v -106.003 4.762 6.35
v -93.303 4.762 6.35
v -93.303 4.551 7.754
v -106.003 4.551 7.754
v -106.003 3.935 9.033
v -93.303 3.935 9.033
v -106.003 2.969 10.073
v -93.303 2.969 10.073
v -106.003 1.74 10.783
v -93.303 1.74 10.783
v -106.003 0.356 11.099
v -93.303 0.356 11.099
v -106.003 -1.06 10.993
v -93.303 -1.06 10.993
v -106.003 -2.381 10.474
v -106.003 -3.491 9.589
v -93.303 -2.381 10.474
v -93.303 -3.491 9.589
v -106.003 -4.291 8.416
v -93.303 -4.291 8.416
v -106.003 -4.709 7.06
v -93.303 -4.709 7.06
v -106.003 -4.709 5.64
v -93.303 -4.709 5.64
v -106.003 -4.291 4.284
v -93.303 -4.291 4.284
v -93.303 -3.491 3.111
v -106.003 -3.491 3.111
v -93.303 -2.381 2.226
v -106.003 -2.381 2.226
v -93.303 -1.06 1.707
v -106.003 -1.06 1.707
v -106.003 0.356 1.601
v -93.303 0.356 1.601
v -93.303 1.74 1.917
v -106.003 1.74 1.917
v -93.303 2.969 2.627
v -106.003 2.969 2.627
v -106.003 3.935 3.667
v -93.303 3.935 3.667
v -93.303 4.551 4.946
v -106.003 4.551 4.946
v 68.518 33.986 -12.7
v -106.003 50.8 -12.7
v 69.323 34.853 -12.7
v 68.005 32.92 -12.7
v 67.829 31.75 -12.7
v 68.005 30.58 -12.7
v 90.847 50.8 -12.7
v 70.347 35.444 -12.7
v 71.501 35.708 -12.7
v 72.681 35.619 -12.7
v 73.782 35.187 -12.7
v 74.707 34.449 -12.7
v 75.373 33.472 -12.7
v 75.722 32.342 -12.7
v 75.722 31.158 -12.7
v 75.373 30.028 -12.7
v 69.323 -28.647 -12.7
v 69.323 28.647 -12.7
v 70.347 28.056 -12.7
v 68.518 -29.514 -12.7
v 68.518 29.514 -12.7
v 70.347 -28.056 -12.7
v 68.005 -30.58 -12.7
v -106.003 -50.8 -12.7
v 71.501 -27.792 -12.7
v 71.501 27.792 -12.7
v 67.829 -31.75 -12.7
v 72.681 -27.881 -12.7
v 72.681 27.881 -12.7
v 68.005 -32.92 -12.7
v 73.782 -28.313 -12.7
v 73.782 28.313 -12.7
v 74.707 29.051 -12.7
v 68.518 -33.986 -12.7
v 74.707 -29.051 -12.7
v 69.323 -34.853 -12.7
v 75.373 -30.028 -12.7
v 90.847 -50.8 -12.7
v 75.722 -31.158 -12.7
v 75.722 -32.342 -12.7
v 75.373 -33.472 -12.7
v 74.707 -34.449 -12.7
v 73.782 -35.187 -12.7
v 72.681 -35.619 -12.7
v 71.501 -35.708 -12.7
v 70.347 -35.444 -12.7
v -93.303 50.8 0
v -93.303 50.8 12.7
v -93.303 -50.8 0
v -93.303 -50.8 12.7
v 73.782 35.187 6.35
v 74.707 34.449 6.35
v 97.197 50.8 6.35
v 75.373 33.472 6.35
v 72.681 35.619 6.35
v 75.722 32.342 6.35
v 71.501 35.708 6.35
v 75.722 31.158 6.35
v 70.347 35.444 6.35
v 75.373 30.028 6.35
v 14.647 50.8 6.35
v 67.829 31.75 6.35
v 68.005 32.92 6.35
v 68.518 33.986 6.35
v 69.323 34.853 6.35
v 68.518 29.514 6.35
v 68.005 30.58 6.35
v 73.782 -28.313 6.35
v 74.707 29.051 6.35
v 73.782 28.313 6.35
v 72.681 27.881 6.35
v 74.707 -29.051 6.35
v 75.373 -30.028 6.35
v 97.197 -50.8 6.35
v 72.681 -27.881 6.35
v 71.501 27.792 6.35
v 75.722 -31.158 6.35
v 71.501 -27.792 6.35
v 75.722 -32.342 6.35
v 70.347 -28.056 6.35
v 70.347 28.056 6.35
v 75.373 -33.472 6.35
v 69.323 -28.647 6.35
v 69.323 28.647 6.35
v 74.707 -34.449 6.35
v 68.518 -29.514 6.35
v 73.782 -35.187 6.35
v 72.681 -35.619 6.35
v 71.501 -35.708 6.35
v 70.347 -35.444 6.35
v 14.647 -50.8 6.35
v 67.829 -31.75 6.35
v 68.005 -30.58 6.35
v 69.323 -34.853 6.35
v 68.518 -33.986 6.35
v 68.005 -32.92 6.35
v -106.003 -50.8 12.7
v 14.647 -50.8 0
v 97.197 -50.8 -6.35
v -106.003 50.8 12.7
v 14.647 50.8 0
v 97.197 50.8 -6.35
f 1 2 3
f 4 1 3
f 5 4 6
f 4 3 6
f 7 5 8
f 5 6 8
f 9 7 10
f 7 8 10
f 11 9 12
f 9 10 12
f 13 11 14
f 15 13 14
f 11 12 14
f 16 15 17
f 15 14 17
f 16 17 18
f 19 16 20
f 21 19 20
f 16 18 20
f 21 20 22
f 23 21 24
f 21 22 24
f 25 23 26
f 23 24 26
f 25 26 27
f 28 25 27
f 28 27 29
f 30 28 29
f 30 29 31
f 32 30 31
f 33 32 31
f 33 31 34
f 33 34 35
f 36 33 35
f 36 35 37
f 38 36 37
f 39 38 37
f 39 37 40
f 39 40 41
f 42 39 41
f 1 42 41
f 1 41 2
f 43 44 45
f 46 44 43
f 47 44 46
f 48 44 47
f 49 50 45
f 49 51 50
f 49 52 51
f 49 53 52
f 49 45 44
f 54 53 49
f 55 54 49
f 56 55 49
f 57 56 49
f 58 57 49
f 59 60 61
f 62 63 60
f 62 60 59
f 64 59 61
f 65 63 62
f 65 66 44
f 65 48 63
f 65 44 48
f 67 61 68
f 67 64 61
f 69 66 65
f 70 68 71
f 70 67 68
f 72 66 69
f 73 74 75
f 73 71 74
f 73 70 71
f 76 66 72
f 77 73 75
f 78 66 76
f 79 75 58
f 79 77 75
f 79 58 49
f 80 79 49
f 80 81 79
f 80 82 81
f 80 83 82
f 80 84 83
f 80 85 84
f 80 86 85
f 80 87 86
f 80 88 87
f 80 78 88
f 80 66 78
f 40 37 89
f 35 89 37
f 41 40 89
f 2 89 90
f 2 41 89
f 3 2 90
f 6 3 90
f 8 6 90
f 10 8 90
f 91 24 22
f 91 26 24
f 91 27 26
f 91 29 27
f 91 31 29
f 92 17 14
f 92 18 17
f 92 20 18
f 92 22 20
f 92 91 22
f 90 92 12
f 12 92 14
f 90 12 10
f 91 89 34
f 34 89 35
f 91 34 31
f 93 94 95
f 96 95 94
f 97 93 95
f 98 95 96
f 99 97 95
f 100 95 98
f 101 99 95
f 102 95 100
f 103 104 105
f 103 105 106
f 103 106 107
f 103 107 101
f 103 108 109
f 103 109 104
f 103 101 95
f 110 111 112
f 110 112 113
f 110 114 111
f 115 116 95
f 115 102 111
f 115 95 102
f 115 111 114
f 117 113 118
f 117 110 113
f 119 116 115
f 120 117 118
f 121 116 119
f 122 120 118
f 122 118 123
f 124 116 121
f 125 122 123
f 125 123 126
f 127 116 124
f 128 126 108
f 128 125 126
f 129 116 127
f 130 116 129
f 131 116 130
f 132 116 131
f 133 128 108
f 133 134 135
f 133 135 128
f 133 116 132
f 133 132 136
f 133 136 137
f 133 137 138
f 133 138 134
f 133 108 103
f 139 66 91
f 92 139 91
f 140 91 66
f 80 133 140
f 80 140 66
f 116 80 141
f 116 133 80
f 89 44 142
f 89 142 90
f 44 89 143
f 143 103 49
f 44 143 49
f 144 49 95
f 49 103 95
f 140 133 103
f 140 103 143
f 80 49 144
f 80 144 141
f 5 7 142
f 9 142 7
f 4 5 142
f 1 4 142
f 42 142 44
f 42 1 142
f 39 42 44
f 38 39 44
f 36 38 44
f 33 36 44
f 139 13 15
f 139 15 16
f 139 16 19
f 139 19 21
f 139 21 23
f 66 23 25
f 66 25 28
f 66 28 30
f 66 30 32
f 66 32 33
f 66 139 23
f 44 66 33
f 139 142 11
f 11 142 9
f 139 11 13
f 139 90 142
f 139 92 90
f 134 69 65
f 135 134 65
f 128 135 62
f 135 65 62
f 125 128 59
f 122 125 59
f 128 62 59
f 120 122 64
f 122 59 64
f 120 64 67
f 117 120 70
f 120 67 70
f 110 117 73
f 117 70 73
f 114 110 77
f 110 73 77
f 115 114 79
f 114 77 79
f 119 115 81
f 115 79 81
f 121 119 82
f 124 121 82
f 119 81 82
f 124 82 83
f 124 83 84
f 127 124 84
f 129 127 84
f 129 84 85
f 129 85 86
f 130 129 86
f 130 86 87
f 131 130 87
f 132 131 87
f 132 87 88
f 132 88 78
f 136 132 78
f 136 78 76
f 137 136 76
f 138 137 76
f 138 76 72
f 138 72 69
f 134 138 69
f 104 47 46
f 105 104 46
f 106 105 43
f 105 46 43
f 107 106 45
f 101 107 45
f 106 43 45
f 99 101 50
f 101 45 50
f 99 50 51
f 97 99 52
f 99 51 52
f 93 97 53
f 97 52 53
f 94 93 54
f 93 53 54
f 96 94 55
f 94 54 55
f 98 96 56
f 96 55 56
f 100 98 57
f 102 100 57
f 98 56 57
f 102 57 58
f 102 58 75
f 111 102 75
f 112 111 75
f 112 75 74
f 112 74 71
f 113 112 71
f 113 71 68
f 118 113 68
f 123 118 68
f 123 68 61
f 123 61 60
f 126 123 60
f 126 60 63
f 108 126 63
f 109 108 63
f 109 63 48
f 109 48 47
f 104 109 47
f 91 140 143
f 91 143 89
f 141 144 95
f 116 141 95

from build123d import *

# Parameters (mm, degrees)
F1_DEPTH = 50.8
F2_SIZE  = 6.35
F4_D     = 7.9375
F6_D     = 9.525
F6_DEPTH = 19.05
F6_TIP   = 2.8615986981


# Not quite as in the source:
# - a length typed as a fraction of an inch, garbled in the dataset ("3 / 203.2 mm" for 3/8 in), is restored


with BuildPart() as f1:
    # F0 (on Front) → F1 (new body, symmetric)
    with BuildSketch(Plane.XZ):
        Polygon((-106.0025989716, 12.7), (-106.0025989716, -12.7), (97.1974010284, -12.7), (97.1974010284, 6.35), (14.6474010284, 6.35), (14.6474010284, 0), (-93.3025989716, 0), (-93.3025989716, 12.7), align=None)
    extrude(amount=F1_DEPTH, both=True)

    # F2
    f2_edges = [f1.edges().sort_by_distance(p)[0] for p in [
        (97.197401, 0, -12.7),
    ]]
    chamfer(f2_edges, length=F2_SIZE)

    # F4 (through all)
    with Locations(Plane.XY.offset(6.35)):
        with Locations((71.7974010284, 31.75), (71.7974010284, -31.75)):
            Hole(F4_D / 2)

    # F6
    with Locations(Plane(origin=(-106.0025989716, 0, 0), x_dir=(0, -1, 0), z_dir=(-1, 0, 0))):
        with Locations((0, 6.35)):
            Hole(F6_D / 2, depth=F6_DEPTH)
            with Locations((0, 0, -(F6_DEPTH + F6_TIP / 2))):  # 118° drill point
                Cone(0, F6_D / 2, F6_TIP, mode=Mode.SUBTRACT)


solid = f1.part
